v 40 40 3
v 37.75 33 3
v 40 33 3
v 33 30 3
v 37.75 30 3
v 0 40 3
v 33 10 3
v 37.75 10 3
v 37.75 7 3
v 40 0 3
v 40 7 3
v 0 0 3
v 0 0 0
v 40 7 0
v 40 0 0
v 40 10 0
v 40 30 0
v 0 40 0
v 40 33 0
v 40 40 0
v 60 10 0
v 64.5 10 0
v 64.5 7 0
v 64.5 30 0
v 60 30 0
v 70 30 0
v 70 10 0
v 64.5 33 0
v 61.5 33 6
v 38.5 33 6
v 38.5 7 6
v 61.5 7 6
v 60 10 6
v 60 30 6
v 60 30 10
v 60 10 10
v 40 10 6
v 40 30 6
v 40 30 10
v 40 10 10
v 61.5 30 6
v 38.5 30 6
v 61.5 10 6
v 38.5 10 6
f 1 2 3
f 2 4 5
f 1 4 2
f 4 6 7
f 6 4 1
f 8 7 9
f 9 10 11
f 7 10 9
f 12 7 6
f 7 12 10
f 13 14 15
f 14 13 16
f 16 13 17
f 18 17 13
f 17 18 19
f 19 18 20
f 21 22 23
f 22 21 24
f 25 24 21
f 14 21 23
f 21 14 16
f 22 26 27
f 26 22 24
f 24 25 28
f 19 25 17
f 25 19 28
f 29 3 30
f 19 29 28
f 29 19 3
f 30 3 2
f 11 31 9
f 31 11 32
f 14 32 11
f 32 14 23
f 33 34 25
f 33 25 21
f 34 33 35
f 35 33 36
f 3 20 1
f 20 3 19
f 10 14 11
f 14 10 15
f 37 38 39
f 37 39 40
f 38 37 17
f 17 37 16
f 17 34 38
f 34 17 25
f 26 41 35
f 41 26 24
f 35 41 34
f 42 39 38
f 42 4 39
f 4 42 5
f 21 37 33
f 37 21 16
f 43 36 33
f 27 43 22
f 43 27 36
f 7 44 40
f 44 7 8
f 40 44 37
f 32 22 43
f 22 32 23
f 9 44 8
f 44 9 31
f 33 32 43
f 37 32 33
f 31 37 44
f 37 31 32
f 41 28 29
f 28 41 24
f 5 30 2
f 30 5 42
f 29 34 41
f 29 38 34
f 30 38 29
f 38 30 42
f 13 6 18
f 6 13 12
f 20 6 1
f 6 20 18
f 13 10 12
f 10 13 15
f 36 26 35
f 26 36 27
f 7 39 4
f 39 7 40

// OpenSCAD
plateWidth = 40;
hookWidth = 3;
gapWidth = 20;
buttressHeight = 5;
wedgeWidth = 10;

cube ([plateWidth, plateWidth, hookWidth]);

translate ([plateWidth - hookWidth, (plateWidth - (gapWidth + (2 * hookWidth))) / 2, 0]) {
    difference () {
        cube ([gapWidth + (2 * hookWidth), gapWidth + (2 * hookWidth), hookWidth]);

        translate ([hookWidth, hookWidth, -hookWidth]) {
            cube ([gapWidth, gapWidth, hookWidth * 2]);
        }
    }

    translate ([0, hookWidth, 0]) {
        rotate([90,0,0]) {
            linear_extrude(height=hookWidth) {
                polygon(points=[
                    [0,0],
                    [hookWidth / 2, 2 * hookWidth],
                    [gapWidth + (3 * hookWidth / 2), 2 * hookWidth],
                    [gapWidth + (5 * hookWidth / 2), 0]
                ], paths=[
                    [0,1,2,3]
                ]);
            }
        }
    }

    translate ([0, (2 * hookWidth) + gapWidth, 0]) {
        rotate([90,0,0]) {
            linear_extrude(height=hookWidth) {
                polygon(points=[
                    [0,0],
                    [hookWidth / 2, 2 * hookWidth],
                    [gapWidth + (3 * hookWidth / 2), 2 * hookWidth],
                    [gapWidth + (5 * hookWidth / 2), 0]
                ], paths=[
                    [0,1,2,3]
                ]);
            }
        }
    }
}

translate ([plateWidth + gapWidth, (plateWidth + gapWidth)/2, 0]) {
    rotate ([90,0,0]) {
        linear_extrude(height=gapWidth) {
            polygon(points=[
                [0,0],
                [0,wedgeWidth],
                [wedgeWidth, 0]
            ], paths=[
                [0, 1, 2]
            ]);
        }
    }
}

translate ([plateWidth, (plateWidth + gapWidth)/2, 0]) {
    rotate([90,0,0]) {
        linear_extrude(height=gapWidth) {
            polygon(points=[
                [0,0],
                [0,wedgeWidth],
                [-wedgeWidth,0]
            ], paths=[
                [0,1,2]
            ]);
        }
    }
}
